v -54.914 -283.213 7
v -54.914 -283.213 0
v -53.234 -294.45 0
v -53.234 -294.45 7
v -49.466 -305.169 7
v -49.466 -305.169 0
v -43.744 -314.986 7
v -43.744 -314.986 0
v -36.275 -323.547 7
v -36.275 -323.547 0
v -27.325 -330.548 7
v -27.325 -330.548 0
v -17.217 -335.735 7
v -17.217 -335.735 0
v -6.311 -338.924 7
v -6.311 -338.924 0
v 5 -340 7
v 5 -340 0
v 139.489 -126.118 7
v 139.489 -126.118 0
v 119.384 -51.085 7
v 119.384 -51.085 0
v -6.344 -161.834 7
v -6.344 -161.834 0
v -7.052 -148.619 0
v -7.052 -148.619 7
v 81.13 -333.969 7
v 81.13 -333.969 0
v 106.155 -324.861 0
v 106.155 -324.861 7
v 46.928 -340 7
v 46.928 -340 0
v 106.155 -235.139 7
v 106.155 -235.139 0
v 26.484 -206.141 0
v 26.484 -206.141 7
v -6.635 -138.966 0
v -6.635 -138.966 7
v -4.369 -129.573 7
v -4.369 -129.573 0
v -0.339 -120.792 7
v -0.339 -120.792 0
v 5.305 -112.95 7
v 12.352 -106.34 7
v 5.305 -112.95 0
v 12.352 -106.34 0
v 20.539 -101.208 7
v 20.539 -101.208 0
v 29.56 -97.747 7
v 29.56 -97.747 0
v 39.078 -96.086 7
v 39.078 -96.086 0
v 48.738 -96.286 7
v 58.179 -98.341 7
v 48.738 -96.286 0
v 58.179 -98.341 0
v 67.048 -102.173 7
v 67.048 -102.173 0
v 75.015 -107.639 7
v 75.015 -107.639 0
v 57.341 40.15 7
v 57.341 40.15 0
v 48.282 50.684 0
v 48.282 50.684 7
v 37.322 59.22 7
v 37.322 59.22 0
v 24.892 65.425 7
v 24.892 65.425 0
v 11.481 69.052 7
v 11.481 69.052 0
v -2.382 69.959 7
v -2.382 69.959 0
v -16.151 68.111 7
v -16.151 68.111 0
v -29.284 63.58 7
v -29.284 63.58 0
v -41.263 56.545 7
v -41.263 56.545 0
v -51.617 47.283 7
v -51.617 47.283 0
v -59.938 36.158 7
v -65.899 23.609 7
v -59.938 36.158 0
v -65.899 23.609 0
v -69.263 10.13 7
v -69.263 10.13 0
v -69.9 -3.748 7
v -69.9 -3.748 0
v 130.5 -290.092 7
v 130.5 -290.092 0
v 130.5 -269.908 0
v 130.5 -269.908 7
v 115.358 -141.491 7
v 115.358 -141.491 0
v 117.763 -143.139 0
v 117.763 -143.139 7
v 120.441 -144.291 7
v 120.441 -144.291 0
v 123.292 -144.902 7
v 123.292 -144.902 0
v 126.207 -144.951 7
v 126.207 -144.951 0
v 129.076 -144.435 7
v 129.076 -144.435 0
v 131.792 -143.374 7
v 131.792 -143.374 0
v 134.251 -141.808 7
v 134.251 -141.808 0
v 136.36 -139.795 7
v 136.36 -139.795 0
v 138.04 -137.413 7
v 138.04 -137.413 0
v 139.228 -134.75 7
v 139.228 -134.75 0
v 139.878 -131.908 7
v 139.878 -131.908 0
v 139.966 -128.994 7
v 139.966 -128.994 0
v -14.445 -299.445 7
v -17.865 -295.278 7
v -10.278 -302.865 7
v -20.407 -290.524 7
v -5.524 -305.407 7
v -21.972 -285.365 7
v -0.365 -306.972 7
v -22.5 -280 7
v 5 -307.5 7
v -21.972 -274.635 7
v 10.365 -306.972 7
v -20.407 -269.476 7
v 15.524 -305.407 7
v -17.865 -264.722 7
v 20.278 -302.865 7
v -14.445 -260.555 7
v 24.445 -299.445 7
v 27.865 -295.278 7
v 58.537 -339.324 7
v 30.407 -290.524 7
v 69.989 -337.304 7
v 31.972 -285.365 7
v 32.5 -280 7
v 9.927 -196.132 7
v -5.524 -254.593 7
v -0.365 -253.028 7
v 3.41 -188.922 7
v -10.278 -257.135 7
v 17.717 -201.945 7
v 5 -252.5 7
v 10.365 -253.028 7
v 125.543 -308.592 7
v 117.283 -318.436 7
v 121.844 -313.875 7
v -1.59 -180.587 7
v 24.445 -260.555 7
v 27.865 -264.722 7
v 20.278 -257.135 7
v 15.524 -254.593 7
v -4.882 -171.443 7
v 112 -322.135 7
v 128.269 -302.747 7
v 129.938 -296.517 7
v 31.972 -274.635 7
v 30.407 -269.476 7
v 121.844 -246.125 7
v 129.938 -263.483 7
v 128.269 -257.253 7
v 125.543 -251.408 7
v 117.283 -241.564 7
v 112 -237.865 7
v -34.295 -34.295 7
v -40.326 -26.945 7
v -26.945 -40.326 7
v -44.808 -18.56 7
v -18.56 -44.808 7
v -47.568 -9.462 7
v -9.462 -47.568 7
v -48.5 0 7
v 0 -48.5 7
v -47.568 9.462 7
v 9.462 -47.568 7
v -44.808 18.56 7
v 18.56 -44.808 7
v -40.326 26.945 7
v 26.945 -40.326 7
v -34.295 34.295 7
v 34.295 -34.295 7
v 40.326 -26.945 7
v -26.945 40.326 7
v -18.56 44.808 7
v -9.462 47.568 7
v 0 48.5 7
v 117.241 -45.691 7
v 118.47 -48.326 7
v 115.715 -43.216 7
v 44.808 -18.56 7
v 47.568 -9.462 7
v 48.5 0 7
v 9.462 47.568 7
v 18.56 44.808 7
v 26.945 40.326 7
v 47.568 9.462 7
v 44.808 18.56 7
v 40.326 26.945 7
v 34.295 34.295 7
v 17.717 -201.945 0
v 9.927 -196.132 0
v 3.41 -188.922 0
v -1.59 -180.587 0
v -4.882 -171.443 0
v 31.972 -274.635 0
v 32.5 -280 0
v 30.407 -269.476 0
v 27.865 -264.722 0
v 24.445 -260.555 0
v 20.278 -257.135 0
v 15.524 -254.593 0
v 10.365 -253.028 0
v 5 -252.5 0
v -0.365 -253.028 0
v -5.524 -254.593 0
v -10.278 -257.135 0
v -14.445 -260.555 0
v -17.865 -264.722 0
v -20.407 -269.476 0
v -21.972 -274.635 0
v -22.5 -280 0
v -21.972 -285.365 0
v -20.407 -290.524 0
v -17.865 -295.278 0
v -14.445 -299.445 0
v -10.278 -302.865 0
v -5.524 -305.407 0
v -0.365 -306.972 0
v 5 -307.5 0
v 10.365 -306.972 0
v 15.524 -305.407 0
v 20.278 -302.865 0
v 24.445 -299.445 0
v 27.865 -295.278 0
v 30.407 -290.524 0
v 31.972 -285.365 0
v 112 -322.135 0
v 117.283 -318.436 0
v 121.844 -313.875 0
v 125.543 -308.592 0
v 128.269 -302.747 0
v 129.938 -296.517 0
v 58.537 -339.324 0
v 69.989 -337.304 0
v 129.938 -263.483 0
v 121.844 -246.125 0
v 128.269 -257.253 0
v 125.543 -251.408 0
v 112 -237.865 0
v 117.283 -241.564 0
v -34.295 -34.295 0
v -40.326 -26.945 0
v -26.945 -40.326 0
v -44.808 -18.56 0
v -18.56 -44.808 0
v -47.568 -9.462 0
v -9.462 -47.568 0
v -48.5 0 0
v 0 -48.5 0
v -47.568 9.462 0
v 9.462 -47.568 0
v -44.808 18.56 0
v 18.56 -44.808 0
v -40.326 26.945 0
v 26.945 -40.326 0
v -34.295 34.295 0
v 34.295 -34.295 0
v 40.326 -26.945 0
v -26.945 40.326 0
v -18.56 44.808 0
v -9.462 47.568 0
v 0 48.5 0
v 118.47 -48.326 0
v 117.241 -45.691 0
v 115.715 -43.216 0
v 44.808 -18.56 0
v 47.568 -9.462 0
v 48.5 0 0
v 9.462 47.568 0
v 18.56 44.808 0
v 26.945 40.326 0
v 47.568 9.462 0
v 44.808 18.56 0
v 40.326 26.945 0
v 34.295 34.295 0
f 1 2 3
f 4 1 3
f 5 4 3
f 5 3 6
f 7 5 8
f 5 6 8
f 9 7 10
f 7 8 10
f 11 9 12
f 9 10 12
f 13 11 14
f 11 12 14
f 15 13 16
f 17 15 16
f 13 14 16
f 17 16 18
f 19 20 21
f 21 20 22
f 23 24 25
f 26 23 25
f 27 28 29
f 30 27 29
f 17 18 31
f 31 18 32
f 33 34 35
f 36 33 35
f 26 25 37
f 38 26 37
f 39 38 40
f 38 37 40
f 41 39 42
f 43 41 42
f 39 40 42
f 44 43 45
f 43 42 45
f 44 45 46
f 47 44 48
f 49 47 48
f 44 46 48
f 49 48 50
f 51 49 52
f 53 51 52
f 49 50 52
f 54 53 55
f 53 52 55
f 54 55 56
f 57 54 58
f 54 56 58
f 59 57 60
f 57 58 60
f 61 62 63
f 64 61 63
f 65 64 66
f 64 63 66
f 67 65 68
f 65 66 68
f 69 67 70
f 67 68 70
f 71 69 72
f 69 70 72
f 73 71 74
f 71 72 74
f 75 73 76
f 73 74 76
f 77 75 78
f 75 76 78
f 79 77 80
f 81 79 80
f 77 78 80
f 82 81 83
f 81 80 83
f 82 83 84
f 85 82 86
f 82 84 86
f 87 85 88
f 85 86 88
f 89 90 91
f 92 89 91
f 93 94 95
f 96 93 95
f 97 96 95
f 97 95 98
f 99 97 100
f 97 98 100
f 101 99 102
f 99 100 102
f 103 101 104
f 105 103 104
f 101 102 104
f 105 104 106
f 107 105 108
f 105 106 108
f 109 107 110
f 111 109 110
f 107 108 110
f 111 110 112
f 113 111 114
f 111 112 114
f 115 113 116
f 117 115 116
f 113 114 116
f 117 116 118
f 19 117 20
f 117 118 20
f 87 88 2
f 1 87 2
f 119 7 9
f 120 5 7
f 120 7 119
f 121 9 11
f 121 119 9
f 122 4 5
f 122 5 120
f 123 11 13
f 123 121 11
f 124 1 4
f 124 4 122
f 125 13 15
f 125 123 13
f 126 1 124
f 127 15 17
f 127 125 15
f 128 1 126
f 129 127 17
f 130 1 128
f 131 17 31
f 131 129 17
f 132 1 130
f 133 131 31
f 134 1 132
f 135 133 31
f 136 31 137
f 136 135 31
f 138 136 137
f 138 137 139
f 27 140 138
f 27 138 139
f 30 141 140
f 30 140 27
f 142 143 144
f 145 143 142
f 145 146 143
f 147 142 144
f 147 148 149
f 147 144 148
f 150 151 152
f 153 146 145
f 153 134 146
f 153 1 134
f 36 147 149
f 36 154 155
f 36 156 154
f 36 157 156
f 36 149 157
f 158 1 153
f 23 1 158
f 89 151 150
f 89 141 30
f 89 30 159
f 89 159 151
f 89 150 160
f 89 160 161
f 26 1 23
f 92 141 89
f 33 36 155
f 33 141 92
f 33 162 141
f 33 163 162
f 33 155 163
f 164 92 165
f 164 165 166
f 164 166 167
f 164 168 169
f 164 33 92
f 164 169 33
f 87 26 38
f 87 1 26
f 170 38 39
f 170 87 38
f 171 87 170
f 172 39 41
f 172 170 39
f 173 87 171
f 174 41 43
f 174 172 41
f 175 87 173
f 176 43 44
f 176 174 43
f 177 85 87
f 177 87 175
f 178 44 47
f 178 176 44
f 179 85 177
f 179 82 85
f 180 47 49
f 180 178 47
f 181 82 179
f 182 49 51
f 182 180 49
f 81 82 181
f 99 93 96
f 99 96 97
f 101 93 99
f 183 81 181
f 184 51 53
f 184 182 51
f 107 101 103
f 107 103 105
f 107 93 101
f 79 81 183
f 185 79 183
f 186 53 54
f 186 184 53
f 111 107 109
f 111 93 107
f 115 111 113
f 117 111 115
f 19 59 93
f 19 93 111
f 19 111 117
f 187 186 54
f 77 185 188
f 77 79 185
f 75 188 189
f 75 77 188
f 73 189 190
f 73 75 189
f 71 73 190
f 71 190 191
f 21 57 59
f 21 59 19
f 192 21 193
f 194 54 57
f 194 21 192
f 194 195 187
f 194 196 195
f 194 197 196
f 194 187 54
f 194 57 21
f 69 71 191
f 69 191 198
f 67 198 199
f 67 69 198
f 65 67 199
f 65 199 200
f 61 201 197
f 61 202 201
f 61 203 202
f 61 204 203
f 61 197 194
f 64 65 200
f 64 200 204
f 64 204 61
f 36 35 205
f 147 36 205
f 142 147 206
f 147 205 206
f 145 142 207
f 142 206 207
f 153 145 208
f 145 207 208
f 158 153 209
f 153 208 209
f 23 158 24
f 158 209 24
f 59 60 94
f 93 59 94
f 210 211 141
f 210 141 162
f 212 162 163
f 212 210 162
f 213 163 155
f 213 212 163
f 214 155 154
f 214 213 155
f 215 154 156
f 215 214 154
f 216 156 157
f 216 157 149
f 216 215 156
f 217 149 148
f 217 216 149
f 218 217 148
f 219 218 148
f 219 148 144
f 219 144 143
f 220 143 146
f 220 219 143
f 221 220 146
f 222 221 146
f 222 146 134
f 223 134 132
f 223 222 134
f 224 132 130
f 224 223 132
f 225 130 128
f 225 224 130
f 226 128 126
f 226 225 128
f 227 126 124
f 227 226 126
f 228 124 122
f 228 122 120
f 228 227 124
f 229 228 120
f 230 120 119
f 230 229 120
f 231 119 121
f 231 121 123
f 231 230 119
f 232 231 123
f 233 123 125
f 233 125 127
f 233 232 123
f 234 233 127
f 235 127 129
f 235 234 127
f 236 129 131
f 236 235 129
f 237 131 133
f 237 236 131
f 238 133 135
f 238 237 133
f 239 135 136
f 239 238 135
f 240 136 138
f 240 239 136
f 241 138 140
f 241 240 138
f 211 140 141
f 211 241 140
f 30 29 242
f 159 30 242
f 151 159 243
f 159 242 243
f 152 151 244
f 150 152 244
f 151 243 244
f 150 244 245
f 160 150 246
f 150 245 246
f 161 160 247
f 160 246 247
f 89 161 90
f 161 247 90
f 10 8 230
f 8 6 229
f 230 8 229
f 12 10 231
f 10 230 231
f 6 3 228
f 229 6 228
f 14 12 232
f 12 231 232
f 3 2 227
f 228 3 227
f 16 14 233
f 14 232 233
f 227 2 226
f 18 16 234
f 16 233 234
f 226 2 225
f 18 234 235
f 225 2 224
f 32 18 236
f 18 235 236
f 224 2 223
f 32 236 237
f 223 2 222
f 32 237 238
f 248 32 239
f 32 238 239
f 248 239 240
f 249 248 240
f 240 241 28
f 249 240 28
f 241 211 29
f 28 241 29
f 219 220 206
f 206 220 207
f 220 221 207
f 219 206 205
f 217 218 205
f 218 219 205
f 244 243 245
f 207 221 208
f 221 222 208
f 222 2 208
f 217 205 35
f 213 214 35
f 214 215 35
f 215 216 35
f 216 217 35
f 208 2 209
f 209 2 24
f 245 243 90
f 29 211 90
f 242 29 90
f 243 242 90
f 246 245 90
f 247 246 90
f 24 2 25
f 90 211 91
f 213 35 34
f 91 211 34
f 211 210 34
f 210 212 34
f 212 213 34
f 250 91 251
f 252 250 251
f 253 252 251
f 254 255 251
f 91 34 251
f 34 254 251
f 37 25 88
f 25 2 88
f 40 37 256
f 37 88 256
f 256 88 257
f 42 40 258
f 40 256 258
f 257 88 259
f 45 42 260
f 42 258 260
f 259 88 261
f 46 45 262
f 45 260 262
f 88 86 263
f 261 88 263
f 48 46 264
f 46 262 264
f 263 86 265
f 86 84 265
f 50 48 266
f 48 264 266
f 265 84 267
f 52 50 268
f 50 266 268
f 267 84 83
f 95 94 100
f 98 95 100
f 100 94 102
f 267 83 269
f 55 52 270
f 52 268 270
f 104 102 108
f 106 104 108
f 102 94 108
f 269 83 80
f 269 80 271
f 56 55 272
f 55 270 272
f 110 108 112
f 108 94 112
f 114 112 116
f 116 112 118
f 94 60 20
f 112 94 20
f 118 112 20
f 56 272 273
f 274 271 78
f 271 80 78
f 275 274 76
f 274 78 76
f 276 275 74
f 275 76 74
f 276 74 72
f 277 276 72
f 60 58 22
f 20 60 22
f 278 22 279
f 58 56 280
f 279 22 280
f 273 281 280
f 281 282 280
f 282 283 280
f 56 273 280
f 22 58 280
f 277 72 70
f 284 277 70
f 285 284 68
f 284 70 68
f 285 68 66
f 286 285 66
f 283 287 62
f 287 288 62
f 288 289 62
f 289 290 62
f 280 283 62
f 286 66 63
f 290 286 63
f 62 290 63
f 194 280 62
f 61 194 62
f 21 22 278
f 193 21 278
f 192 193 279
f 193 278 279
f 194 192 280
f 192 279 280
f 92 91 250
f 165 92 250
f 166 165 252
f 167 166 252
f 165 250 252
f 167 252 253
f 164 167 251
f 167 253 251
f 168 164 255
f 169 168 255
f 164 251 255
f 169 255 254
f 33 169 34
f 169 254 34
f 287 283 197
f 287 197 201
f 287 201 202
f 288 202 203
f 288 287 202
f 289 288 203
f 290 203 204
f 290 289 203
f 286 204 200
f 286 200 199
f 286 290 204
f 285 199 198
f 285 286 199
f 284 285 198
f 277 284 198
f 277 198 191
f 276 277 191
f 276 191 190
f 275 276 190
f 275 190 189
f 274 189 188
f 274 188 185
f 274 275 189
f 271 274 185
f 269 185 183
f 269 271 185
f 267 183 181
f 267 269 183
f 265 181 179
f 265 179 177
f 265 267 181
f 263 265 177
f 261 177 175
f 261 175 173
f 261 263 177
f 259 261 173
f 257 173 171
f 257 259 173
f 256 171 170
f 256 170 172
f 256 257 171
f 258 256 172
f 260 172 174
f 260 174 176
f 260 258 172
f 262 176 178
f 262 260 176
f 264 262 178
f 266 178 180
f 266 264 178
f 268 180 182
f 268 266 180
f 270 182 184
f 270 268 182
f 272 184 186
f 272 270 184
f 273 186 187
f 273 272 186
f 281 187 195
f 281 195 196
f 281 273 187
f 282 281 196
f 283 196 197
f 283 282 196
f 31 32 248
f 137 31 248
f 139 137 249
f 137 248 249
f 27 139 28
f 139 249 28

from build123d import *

# Parameters (mm, degrees)
SKETCH1_R          = 48.5
SKETCH1_R_2        = 27.5
BASE_EXTRUDE_DEPTH = 7


with BuildPart() as part:
    # Sketch1 → Base-Extrude (new body)
    with BuildSketch(Plane.XY):
        with BuildLine():
            Line((-6.343577624, -161.833816921), (-7.052214122, -148.618592863))
            ThreePointArc((-7.052214122, -148.618592863), (20.539062499, -101.208107275), (75.015436064, -107.639080177))
            Line((75.015436064, -107.639080177), (115.358185855, -141.490666647))
            ThreePointArc((115.358185855, -141.490666647), (133.059494125, -142.650871687), (139.488887394, -126.117714323))
            Line((139.488887394, -126.117714323), (119.384026274, -51.085351142))
            ThreePointArc((119.384026274, -51.085351142), (117.893575292, -46.990370726), (115.714681724, -43.216416361))
            Line((115.714681724, -43.216416361), (57.3406431, 40.150350545))
            ThreePointArc((57.3406431, 40.150350545), (-22.829860749, 66.172482636), (-69.899577583, -3.748206743))
            Line((-69.899577583, -3.748206743), (-54.913923642, -283.212748636))
            ThreePointArc((-54.913923642, -283.212748636), (-36.27490207, -323.547473625), (5, -340))
            Line((5, -340), (46.927843862, -340))
            ThreePointArc((46.927843862, -340), (64.292661629, -338.480775301), (81.129858195, -333.969262079))
            Line((81.129858195, -333.969262079), (106.154745303, -324.860948055))
            ThreePointArc((106.154745303, -324.860948055), (123.808625639, -311.314649231), (130.5, -290.092321086))
            Line((130.5, -290.092321086), (130.5, -269.907678914))
            ThreePointArc((130.5, -269.907678914), (123.808625639, -248.685350769), (106.154745303, -235.139051945))
            Line((106.154745303, -235.139051945), (26.483684912, -206.14115743))
            ThreePointArc((26.483684912, -206.14115743), (3.409872911, -188.922008159), (-6.343577624, -161.833816921))
        make_face()
        Circle(SKETCH1_R, mode=Mode.SUBTRACT)
        with Locations((5, -280)):
            Circle(SKETCH1_R_2, mode=Mode.SUBTRACT)
    extrude(amount=BASE_EXTRUDE_DEPTH)


solid = part.part
